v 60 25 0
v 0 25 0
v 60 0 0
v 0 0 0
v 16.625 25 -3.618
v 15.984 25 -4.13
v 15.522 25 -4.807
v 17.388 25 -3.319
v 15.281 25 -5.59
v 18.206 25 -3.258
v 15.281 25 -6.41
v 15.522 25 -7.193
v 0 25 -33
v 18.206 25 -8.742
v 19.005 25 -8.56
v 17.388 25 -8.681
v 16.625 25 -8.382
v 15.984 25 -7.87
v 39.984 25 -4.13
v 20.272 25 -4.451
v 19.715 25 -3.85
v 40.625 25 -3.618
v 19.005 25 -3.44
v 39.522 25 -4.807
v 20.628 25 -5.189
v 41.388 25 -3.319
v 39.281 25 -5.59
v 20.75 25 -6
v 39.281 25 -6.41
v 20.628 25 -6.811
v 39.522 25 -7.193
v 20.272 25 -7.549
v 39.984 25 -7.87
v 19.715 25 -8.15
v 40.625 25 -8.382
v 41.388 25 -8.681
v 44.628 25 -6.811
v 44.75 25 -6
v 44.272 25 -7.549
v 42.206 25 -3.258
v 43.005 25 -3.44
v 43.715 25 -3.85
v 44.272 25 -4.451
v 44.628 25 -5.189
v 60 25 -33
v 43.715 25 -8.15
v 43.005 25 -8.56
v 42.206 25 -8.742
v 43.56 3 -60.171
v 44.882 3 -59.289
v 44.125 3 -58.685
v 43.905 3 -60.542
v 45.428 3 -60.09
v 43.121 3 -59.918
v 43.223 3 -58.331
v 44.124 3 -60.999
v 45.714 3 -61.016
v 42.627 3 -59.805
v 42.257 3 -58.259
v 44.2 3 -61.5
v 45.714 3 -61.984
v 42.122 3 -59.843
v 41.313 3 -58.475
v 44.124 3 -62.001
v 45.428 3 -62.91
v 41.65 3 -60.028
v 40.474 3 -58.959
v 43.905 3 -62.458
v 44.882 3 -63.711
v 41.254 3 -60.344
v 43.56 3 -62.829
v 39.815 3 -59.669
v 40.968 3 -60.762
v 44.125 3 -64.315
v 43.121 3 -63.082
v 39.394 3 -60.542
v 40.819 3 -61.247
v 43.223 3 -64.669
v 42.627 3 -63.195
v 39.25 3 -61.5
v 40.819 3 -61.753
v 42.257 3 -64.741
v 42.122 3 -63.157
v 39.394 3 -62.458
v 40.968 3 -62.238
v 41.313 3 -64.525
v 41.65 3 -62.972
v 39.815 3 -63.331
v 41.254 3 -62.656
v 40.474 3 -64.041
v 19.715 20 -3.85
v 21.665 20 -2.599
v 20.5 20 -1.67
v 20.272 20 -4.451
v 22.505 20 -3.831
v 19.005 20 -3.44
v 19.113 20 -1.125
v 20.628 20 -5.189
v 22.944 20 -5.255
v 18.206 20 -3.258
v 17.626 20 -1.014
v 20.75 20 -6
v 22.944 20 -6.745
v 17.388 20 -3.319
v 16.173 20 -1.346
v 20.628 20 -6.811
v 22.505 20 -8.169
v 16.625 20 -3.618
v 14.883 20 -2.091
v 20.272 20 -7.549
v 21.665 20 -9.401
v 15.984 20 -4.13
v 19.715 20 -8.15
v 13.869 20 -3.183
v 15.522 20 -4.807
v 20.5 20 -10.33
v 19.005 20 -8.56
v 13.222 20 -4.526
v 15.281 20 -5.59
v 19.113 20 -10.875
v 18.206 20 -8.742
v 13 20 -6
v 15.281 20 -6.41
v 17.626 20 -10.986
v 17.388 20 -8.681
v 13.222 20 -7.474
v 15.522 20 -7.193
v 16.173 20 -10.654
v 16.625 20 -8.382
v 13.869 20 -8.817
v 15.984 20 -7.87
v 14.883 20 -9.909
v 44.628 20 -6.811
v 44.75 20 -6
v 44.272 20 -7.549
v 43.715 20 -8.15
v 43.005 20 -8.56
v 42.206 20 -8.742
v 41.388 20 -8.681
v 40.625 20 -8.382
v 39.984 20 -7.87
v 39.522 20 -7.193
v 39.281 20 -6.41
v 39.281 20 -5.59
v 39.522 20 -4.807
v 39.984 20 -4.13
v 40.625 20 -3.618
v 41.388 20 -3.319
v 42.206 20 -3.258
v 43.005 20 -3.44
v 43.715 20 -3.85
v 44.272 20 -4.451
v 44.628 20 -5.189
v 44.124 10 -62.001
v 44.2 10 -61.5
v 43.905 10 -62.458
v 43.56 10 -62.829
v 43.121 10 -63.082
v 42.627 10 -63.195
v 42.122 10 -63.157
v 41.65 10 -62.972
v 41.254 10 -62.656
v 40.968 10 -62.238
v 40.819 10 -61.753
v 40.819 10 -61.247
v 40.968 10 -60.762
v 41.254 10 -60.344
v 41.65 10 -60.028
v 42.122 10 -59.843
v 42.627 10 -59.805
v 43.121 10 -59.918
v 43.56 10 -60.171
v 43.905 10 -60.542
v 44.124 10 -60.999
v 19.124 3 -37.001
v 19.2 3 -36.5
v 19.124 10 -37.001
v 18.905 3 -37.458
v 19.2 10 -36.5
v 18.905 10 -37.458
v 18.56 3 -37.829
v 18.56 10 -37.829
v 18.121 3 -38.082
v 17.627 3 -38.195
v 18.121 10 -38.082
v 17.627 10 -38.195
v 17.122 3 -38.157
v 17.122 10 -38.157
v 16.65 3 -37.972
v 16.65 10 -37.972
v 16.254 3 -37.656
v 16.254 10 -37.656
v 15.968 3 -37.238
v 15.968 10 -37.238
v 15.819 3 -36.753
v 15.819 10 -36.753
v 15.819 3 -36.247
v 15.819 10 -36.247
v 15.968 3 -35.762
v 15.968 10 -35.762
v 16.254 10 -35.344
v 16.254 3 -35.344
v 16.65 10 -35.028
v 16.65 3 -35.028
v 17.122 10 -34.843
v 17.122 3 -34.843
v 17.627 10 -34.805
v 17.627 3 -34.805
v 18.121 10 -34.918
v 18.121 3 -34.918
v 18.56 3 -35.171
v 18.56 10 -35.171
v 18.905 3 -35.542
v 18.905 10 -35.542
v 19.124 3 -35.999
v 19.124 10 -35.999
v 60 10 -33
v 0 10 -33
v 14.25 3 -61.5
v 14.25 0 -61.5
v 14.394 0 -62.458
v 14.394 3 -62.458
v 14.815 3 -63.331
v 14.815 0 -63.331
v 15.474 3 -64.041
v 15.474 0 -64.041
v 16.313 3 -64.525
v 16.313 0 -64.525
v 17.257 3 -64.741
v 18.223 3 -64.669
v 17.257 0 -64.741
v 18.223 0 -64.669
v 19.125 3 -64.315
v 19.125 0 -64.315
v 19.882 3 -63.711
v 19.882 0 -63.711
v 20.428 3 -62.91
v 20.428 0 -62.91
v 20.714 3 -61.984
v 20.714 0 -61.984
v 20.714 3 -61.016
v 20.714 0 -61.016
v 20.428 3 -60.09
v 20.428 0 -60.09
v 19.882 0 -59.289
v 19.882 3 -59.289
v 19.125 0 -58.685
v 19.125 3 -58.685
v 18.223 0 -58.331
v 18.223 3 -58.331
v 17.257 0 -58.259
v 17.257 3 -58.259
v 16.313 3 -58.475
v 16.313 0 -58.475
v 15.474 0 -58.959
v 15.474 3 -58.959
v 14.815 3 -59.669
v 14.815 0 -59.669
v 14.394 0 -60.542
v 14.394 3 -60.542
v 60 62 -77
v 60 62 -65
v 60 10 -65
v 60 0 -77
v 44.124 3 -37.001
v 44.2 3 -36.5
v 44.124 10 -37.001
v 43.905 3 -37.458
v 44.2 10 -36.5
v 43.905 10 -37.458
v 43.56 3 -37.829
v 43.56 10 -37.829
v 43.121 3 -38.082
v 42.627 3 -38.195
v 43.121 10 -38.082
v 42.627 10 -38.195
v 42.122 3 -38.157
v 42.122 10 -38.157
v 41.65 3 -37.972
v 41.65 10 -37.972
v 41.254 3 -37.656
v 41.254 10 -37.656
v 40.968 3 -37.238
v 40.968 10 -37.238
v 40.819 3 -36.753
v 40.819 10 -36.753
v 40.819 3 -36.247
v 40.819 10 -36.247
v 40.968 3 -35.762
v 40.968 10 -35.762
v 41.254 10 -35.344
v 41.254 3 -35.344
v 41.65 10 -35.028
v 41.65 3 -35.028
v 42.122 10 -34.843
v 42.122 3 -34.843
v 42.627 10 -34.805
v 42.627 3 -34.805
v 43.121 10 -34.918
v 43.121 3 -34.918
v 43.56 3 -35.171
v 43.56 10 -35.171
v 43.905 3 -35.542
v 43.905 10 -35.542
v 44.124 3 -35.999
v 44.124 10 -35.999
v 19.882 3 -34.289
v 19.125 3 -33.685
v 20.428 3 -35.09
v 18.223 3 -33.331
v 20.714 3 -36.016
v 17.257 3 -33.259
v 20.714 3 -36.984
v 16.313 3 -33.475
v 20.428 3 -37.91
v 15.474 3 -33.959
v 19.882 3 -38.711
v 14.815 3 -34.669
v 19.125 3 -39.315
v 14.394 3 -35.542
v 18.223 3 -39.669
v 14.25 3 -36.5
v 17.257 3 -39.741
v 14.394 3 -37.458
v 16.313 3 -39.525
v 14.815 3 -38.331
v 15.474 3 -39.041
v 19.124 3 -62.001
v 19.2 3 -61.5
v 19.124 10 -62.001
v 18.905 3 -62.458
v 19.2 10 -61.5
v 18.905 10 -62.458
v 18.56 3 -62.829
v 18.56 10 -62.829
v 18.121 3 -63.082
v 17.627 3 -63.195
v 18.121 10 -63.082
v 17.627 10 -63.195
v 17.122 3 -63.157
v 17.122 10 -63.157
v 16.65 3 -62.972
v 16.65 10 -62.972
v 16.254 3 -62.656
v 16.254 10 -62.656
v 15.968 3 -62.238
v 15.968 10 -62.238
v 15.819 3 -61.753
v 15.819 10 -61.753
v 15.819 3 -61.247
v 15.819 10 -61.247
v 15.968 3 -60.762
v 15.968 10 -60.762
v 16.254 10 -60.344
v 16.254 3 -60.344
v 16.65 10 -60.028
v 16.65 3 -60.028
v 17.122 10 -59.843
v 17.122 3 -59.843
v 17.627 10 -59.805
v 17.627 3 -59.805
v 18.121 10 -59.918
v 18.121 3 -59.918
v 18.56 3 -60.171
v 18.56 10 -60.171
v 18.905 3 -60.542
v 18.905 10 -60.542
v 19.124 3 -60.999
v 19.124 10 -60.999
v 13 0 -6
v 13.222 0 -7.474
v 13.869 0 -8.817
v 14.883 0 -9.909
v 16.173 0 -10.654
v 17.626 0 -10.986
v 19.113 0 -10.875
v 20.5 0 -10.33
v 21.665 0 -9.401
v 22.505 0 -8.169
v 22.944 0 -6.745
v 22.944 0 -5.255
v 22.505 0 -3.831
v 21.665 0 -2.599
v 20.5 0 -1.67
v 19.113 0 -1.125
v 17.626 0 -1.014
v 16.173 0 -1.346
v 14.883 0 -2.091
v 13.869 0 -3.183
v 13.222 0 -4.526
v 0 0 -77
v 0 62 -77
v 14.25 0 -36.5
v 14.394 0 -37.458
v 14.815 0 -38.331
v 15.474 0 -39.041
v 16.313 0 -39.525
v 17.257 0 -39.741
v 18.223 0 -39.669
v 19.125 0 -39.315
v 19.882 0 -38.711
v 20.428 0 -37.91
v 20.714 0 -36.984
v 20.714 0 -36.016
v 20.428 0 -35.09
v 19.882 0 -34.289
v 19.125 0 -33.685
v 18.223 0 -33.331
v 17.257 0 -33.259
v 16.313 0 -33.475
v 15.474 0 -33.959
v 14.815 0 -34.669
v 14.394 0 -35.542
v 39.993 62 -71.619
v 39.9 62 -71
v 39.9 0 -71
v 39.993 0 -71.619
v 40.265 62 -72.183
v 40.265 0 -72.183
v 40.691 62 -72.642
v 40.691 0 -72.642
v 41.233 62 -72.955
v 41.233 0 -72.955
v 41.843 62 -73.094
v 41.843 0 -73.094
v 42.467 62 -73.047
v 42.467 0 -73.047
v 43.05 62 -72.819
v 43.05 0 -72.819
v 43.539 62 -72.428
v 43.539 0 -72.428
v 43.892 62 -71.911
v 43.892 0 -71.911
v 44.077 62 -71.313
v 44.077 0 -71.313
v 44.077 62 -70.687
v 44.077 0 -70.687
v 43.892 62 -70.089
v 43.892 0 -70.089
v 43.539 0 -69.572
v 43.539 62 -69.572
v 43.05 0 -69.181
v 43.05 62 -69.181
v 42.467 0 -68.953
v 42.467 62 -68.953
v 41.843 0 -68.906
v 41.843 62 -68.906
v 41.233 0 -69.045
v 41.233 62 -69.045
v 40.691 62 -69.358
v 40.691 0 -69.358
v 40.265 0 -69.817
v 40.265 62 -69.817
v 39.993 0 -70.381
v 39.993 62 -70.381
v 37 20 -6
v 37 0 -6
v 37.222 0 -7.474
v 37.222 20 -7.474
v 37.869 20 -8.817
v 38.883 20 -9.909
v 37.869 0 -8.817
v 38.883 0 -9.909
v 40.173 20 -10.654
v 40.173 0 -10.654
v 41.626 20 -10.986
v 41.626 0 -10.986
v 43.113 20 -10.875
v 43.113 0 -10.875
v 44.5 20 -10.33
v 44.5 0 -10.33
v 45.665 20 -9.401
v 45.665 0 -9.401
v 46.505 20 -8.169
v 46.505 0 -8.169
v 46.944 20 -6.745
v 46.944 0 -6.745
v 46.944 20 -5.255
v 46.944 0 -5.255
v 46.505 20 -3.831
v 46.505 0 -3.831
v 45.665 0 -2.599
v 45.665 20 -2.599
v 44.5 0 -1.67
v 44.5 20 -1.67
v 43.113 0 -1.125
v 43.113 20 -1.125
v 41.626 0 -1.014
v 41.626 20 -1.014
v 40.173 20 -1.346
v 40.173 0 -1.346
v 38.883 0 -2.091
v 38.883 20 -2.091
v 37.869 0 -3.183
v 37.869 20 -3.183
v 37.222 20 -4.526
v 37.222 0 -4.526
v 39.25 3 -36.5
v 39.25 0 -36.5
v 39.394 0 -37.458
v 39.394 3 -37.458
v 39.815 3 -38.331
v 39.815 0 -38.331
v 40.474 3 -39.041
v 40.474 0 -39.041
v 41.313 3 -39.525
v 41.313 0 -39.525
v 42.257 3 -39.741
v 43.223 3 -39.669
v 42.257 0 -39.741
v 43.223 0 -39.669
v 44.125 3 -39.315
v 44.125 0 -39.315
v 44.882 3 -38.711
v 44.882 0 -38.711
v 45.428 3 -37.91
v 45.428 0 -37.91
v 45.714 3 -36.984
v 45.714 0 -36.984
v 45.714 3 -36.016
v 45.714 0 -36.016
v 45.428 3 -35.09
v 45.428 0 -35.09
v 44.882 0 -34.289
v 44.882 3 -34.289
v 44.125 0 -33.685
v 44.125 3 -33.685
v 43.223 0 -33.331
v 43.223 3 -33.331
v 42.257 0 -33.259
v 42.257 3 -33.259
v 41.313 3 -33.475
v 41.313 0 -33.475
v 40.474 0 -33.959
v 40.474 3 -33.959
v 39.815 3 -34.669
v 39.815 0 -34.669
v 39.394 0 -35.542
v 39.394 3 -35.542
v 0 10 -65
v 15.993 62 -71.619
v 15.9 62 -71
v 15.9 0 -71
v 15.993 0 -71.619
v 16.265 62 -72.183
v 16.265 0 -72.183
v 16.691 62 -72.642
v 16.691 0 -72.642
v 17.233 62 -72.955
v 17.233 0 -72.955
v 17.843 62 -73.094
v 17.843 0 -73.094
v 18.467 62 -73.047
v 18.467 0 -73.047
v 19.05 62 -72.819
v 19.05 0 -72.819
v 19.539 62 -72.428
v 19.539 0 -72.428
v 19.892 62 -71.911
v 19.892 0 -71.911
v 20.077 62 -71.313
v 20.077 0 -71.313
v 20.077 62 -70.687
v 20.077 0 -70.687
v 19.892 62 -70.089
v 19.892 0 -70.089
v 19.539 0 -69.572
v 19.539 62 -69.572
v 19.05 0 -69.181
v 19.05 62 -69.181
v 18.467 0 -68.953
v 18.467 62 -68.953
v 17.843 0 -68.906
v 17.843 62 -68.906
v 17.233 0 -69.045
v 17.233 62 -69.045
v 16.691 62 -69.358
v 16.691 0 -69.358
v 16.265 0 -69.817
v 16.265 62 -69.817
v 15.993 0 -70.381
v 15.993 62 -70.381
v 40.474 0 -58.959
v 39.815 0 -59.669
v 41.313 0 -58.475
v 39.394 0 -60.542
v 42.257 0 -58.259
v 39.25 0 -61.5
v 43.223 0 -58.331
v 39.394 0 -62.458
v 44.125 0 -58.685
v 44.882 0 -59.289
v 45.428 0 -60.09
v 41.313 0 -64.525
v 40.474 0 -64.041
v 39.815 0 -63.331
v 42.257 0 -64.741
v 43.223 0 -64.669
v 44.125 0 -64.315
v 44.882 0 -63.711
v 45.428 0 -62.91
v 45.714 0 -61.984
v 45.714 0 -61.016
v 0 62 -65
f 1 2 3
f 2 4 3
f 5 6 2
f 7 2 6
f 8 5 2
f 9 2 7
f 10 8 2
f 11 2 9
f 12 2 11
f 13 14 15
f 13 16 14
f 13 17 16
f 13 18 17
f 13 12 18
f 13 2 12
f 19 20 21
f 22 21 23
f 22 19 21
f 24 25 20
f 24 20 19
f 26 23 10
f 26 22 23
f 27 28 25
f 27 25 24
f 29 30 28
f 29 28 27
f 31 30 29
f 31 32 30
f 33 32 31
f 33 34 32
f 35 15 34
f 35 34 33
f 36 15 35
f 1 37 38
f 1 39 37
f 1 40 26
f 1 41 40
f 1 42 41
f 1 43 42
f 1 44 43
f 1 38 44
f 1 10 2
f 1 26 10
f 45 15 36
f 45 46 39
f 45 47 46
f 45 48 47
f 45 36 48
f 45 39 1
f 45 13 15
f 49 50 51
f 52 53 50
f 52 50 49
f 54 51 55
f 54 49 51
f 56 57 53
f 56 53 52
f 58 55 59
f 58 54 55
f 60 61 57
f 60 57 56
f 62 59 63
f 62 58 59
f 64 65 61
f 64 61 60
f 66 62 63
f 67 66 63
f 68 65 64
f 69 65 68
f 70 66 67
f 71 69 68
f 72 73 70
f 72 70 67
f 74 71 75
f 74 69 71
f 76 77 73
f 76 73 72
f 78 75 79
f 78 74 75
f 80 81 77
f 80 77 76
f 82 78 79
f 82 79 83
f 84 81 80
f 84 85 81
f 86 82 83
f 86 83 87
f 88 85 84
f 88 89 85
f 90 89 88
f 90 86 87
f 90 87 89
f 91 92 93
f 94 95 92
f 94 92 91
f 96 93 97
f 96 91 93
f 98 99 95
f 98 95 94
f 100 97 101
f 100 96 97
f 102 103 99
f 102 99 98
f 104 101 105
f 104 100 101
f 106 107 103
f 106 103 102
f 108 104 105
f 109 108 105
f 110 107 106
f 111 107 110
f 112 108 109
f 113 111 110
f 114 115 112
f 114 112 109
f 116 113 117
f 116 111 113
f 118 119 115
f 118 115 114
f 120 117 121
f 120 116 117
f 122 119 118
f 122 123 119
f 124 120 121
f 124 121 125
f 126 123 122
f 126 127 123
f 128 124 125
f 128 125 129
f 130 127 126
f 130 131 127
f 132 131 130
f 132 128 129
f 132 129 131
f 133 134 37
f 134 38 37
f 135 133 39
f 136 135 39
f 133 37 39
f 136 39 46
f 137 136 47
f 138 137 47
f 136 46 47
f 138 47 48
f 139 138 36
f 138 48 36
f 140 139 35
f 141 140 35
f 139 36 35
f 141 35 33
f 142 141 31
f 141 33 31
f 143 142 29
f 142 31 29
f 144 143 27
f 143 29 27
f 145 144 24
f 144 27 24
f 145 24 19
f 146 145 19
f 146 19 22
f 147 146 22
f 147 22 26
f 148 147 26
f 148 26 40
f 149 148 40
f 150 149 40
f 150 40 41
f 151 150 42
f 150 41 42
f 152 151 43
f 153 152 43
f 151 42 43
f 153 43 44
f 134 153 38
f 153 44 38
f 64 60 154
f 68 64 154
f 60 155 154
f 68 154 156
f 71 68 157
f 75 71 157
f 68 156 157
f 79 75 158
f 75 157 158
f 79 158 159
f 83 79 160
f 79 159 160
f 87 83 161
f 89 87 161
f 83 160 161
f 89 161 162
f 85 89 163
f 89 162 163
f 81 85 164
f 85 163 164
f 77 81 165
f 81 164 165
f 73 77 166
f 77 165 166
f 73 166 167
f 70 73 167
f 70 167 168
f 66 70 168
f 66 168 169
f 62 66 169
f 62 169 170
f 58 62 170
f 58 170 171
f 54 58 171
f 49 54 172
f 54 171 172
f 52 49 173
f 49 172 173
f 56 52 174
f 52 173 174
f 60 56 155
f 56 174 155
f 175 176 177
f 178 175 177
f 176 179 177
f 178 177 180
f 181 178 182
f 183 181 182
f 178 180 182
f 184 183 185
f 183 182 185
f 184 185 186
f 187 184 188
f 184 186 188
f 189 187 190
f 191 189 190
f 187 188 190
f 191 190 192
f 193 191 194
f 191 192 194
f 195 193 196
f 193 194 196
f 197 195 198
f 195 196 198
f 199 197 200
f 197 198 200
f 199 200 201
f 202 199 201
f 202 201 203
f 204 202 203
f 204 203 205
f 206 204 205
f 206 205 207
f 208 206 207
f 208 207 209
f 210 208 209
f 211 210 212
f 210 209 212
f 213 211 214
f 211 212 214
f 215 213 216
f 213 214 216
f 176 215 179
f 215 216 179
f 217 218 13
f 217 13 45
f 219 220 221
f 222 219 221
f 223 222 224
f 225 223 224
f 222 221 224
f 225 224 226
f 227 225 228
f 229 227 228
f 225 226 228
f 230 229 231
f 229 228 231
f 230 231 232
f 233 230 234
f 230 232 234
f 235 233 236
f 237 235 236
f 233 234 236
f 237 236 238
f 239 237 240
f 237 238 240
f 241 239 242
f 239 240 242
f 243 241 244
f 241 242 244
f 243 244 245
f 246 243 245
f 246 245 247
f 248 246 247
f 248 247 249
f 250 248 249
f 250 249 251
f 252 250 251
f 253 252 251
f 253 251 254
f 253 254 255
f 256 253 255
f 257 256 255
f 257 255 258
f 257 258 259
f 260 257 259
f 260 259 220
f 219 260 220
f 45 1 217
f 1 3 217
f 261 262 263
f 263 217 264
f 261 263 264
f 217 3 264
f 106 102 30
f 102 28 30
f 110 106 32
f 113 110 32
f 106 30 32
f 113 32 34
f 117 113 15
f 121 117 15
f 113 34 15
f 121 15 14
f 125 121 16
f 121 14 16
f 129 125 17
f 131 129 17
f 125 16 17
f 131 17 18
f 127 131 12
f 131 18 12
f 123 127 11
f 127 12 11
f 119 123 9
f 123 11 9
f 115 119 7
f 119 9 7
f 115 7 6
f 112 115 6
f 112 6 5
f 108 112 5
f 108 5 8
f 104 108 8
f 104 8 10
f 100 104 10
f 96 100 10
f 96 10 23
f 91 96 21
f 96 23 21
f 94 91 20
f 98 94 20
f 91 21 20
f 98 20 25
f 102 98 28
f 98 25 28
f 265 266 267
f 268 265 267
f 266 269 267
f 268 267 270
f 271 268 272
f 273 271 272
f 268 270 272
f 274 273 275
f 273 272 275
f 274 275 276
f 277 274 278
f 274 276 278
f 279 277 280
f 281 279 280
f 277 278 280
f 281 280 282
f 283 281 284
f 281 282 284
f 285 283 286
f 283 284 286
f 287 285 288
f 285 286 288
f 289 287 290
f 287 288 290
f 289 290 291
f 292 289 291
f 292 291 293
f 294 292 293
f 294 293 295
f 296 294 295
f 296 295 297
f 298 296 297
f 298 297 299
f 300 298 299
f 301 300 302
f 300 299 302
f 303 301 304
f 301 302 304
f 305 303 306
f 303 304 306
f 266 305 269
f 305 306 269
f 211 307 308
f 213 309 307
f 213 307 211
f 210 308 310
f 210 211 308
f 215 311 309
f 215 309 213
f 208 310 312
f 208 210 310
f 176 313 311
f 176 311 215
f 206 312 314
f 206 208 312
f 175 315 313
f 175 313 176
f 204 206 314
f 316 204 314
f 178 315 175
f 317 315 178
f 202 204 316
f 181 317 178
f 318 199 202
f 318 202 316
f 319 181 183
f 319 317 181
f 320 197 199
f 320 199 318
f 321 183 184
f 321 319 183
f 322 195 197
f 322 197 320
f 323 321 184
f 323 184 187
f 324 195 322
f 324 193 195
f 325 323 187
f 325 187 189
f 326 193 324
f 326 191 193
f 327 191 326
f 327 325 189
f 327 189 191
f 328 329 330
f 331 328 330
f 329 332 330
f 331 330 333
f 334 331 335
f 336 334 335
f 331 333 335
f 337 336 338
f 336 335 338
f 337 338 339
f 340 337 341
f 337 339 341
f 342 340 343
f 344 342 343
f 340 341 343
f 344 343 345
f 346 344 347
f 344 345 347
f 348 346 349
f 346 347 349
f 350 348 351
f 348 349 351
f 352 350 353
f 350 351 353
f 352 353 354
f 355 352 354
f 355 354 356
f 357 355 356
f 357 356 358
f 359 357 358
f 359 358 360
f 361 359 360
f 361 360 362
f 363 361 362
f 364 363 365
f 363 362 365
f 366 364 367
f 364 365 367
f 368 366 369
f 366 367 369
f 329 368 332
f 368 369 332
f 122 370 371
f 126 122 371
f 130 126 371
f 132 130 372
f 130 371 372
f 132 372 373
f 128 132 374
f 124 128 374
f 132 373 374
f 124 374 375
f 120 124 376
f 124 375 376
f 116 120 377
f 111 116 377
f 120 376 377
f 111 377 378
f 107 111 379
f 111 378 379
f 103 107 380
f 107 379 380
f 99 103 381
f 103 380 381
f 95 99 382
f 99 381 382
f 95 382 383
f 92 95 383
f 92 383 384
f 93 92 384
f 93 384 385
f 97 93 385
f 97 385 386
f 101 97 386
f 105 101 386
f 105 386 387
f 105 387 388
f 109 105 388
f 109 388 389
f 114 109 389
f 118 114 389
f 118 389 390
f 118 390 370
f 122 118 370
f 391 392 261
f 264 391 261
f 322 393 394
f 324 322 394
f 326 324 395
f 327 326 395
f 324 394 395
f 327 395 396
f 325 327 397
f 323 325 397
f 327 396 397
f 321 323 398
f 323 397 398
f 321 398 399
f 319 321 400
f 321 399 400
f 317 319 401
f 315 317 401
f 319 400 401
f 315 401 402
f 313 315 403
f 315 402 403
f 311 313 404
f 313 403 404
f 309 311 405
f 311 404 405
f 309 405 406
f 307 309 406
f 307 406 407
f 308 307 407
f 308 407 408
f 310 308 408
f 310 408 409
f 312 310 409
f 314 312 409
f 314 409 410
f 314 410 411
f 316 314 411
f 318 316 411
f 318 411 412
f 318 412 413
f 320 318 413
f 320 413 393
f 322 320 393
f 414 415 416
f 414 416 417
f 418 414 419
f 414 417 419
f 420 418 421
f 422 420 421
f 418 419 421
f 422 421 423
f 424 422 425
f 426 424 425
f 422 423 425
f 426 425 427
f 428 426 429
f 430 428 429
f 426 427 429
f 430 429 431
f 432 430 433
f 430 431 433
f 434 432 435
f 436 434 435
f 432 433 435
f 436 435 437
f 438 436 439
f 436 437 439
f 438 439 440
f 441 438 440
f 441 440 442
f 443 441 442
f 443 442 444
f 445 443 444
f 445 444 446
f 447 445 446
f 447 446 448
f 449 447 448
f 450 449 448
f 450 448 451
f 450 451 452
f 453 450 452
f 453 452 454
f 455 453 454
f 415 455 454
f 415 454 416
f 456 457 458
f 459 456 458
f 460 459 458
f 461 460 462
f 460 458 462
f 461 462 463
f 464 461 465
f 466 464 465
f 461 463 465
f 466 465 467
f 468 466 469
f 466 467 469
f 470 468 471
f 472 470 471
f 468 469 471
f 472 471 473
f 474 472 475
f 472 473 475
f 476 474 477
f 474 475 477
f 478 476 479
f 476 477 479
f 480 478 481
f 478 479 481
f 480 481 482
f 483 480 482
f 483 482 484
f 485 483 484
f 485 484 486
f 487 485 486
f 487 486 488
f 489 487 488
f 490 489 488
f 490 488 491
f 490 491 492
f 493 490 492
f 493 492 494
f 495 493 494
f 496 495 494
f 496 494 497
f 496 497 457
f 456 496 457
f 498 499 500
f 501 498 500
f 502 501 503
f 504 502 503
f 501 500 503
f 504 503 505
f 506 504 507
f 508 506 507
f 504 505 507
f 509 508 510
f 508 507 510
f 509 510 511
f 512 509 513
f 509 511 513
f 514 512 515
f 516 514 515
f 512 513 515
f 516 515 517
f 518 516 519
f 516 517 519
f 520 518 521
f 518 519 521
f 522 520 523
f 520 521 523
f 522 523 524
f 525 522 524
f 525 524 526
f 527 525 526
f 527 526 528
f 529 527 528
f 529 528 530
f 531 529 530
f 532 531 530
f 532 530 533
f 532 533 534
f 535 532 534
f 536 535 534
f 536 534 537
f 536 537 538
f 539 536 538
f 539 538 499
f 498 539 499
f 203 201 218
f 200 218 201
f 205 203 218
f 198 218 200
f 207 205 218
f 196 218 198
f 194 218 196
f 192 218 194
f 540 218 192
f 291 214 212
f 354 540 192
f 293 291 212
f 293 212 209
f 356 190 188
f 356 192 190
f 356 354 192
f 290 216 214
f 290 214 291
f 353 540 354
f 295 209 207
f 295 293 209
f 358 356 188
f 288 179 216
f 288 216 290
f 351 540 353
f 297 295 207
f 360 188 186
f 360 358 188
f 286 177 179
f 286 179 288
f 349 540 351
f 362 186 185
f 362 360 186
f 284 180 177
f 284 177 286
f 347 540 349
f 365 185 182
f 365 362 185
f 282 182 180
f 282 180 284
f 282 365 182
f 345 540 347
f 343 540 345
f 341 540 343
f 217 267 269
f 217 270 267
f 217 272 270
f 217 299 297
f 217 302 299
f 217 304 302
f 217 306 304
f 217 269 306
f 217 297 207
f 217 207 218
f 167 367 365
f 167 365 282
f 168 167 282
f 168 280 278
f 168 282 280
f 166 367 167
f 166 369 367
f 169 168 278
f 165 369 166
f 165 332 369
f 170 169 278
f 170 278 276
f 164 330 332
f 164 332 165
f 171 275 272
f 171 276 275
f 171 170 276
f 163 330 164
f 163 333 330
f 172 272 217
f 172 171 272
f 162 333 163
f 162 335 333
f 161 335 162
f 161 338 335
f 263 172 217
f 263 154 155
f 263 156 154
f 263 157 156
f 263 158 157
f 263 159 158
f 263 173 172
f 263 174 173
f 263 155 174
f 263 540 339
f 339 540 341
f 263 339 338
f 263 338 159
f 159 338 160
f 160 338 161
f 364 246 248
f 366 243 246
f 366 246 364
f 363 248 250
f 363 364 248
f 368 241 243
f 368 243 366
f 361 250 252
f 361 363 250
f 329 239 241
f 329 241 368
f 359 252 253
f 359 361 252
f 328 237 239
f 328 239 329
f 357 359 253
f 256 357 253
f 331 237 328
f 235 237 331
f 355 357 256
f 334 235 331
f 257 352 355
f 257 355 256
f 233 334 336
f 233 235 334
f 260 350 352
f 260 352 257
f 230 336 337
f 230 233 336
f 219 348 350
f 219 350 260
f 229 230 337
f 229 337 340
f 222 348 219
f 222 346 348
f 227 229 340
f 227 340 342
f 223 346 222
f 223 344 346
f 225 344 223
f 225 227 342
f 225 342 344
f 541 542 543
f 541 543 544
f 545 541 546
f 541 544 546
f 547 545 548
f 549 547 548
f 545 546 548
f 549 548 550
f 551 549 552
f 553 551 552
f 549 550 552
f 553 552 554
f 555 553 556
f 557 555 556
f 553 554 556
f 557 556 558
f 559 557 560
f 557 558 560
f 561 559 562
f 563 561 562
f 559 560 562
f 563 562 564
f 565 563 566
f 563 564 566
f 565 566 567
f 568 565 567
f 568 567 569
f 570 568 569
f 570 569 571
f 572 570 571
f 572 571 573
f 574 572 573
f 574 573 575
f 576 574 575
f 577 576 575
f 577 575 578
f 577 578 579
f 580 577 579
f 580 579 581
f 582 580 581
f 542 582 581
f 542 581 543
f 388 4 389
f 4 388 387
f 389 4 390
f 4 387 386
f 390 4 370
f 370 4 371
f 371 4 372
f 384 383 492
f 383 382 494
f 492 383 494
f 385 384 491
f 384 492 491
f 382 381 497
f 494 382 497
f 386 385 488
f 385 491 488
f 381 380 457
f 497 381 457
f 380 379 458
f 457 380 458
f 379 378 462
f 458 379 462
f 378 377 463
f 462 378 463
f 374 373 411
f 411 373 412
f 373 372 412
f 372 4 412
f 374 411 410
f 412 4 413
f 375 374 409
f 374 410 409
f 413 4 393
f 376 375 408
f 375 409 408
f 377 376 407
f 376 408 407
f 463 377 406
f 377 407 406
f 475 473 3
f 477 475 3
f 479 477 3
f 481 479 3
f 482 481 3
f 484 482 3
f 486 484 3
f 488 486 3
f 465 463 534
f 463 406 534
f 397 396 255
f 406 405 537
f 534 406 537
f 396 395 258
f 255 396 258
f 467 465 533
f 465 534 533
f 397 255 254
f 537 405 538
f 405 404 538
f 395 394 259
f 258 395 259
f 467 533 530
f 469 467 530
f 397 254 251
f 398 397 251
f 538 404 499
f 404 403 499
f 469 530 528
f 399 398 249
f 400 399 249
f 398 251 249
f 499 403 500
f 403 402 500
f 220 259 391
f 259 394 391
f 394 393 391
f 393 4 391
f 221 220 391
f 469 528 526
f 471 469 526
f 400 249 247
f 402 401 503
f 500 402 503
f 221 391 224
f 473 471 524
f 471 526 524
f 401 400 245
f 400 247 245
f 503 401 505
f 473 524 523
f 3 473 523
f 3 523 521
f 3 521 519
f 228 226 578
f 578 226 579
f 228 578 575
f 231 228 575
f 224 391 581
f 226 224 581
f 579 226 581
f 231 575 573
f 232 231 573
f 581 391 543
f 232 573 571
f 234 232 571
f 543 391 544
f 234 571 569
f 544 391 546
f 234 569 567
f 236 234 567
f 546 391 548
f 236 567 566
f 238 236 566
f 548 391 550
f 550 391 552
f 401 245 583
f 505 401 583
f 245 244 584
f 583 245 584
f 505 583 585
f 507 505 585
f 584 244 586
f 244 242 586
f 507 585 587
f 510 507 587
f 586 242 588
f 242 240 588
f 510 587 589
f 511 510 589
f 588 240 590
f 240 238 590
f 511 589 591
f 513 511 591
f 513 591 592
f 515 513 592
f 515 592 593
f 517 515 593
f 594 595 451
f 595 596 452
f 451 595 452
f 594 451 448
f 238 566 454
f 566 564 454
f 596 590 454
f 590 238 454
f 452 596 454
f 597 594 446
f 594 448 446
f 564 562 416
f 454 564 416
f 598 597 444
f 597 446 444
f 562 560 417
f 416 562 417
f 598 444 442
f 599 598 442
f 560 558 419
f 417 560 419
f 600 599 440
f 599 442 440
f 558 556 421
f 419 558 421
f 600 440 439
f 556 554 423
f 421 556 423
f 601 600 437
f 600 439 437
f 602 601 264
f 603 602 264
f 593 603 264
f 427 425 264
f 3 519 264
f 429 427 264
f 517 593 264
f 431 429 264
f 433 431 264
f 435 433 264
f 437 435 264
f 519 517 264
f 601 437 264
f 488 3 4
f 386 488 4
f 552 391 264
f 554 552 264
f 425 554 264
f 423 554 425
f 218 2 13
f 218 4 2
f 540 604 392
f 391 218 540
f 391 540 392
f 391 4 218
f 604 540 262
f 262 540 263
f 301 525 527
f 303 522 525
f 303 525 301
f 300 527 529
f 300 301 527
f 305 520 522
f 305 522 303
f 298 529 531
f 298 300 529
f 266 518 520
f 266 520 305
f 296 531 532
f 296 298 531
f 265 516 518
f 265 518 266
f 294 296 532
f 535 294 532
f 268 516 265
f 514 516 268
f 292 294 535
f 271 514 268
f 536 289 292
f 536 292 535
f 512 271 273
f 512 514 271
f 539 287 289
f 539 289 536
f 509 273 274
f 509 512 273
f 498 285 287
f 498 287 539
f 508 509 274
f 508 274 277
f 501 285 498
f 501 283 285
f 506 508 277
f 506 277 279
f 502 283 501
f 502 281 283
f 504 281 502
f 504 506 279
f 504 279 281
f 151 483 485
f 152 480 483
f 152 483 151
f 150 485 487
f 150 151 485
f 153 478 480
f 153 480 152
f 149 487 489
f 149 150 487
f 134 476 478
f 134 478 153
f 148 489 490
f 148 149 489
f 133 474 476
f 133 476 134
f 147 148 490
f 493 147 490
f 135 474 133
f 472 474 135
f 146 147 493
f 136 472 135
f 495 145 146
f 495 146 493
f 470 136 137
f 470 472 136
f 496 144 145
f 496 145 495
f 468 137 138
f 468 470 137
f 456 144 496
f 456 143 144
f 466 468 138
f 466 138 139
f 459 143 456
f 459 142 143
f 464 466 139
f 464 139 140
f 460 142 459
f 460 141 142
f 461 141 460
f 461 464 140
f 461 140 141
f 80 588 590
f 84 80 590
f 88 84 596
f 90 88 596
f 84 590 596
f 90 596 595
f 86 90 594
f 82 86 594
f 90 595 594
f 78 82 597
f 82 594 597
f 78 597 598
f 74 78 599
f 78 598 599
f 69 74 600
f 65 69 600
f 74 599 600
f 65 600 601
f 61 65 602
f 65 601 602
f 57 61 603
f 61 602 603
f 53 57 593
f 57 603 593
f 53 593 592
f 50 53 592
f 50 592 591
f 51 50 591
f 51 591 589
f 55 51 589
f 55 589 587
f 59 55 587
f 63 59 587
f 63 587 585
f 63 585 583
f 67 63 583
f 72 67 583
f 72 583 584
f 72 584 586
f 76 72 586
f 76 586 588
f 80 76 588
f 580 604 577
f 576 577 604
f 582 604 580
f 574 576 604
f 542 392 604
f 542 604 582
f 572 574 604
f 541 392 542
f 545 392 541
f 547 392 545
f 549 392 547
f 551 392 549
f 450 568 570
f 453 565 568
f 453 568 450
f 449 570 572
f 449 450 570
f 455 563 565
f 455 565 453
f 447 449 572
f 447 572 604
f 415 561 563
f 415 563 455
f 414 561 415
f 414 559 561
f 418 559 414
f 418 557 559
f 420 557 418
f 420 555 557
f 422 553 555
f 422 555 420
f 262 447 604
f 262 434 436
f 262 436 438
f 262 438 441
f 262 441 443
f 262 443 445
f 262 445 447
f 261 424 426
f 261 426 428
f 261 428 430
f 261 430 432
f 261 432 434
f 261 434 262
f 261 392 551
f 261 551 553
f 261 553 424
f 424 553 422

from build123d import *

# Parameters (mm, degrees)
SKETCH1_W                      = 60
SKETCH1_H                      = 77
BOSS_EXTRUDE1_DEPTH            = 10
SKETCH2_W                      = 60
SKETCH2_H                      = 12
BOSS_EXTRUDE2_DEPTH            = 52
SKETCH3_W                      = 60
SKETCH3_H                      = 33
BOSS_EXTRUDE3_DEPTH            = 15
M5X0_8_TAPPED_HOLE1_D          = 4.2
CBORE_FOR_M5_SHCS1_D           = 5.5
CBORE_FOR_M5_SHCS1_CBORE_D     = 10
CBORE_FOR_M5_SHCS1_CBORE_DEPTH = 20
CBORE_FOR_M3_SHCS1_D           = 3.4
CBORE_FOR_M3_SHCS1_CBORE_D     = 6.5
CBORE_FOR_M3_SHCS1_CBORE_DEPTH = 3


with BuildPart() as part:
    # Sketch1 → Boss-Extrude1 (new body)
    with BuildSketch(Plane(origin=(0, 0, 0), x_dir=(1, 0, 0), z_dir=(0, 1, 0))):
        with Locations((30, 38.5)):
            Rectangle(SKETCH1_W, SKETCH1_H)
    extrude(amount=BOSS_EXTRUDE1_DEPTH)

    # Sketch2 → Boss-Extrude2 (add)
    with BuildSketch(Plane(origin=(0, 10, 0), x_dir=(1, 0, 0), z_dir=(0, 1, 0))):
        with Locations((30, 71)):
            Rectangle(SKETCH2_W, SKETCH2_H)
    extrude(amount=BOSS_EXTRUDE2_DEPTH)

    # Sketch3 → Boss-Extrude3 (add)
    with BuildSketch(Plane(origin=(0, 10, 0), x_dir=(1, 0, 0), z_dir=(0, 1, 0))):
        with Locations((30, 16.5)):
            Rectangle(SKETCH3_W, SKETCH3_H)
    extrude(amount=BOSS_EXTRUDE3_DEPTH)

    # M5x0.8 Tapped Hole1 (through all)
    with Locations(Plane(origin=(0, 62, 0), x_dir=(1, 0, 0), z_dir=(0, 1, 0))):
        with Locations((18, 71), (42, 71)):
            Hole(M5X0_8_TAPPED_HOLE1_D / 2)

    # CBORE for M5 SHCS1 (through all)
    with Locations(Plane(origin=(0, 0, 0), x_dir=(-1, 0, 0), z_dir=(0, -1, 0))):
        with Locations((-42, 6), (-18, 6)):
            CounterBoreHole(CBORE_FOR_M5_SHCS1_D / 2, CBORE_FOR_M5_SHCS1_CBORE_D / 2, CBORE_FOR_M5_SHCS1_CBORE_DEPTH)

    # CBORE for M3 SHCS1 (through all)
    with Locations(Plane(origin=(0, 0, 0), x_dir=(-1, 0, 0), z_dir=(0, -1, 0))):
        with Locations((-42.5, 61.5), (-17.5, 61.5), (-17.5, 36.5), (-42.5, 36.5)):
            CounterBoreHole(CBORE_FOR_M3_SHCS1_D / 2, CBORE_FOR_M3_SHCS1_CBORE_D / 2, CBORE_FOR_M3_SHCS1_CBORE_DEPTH)


solid = part.part
